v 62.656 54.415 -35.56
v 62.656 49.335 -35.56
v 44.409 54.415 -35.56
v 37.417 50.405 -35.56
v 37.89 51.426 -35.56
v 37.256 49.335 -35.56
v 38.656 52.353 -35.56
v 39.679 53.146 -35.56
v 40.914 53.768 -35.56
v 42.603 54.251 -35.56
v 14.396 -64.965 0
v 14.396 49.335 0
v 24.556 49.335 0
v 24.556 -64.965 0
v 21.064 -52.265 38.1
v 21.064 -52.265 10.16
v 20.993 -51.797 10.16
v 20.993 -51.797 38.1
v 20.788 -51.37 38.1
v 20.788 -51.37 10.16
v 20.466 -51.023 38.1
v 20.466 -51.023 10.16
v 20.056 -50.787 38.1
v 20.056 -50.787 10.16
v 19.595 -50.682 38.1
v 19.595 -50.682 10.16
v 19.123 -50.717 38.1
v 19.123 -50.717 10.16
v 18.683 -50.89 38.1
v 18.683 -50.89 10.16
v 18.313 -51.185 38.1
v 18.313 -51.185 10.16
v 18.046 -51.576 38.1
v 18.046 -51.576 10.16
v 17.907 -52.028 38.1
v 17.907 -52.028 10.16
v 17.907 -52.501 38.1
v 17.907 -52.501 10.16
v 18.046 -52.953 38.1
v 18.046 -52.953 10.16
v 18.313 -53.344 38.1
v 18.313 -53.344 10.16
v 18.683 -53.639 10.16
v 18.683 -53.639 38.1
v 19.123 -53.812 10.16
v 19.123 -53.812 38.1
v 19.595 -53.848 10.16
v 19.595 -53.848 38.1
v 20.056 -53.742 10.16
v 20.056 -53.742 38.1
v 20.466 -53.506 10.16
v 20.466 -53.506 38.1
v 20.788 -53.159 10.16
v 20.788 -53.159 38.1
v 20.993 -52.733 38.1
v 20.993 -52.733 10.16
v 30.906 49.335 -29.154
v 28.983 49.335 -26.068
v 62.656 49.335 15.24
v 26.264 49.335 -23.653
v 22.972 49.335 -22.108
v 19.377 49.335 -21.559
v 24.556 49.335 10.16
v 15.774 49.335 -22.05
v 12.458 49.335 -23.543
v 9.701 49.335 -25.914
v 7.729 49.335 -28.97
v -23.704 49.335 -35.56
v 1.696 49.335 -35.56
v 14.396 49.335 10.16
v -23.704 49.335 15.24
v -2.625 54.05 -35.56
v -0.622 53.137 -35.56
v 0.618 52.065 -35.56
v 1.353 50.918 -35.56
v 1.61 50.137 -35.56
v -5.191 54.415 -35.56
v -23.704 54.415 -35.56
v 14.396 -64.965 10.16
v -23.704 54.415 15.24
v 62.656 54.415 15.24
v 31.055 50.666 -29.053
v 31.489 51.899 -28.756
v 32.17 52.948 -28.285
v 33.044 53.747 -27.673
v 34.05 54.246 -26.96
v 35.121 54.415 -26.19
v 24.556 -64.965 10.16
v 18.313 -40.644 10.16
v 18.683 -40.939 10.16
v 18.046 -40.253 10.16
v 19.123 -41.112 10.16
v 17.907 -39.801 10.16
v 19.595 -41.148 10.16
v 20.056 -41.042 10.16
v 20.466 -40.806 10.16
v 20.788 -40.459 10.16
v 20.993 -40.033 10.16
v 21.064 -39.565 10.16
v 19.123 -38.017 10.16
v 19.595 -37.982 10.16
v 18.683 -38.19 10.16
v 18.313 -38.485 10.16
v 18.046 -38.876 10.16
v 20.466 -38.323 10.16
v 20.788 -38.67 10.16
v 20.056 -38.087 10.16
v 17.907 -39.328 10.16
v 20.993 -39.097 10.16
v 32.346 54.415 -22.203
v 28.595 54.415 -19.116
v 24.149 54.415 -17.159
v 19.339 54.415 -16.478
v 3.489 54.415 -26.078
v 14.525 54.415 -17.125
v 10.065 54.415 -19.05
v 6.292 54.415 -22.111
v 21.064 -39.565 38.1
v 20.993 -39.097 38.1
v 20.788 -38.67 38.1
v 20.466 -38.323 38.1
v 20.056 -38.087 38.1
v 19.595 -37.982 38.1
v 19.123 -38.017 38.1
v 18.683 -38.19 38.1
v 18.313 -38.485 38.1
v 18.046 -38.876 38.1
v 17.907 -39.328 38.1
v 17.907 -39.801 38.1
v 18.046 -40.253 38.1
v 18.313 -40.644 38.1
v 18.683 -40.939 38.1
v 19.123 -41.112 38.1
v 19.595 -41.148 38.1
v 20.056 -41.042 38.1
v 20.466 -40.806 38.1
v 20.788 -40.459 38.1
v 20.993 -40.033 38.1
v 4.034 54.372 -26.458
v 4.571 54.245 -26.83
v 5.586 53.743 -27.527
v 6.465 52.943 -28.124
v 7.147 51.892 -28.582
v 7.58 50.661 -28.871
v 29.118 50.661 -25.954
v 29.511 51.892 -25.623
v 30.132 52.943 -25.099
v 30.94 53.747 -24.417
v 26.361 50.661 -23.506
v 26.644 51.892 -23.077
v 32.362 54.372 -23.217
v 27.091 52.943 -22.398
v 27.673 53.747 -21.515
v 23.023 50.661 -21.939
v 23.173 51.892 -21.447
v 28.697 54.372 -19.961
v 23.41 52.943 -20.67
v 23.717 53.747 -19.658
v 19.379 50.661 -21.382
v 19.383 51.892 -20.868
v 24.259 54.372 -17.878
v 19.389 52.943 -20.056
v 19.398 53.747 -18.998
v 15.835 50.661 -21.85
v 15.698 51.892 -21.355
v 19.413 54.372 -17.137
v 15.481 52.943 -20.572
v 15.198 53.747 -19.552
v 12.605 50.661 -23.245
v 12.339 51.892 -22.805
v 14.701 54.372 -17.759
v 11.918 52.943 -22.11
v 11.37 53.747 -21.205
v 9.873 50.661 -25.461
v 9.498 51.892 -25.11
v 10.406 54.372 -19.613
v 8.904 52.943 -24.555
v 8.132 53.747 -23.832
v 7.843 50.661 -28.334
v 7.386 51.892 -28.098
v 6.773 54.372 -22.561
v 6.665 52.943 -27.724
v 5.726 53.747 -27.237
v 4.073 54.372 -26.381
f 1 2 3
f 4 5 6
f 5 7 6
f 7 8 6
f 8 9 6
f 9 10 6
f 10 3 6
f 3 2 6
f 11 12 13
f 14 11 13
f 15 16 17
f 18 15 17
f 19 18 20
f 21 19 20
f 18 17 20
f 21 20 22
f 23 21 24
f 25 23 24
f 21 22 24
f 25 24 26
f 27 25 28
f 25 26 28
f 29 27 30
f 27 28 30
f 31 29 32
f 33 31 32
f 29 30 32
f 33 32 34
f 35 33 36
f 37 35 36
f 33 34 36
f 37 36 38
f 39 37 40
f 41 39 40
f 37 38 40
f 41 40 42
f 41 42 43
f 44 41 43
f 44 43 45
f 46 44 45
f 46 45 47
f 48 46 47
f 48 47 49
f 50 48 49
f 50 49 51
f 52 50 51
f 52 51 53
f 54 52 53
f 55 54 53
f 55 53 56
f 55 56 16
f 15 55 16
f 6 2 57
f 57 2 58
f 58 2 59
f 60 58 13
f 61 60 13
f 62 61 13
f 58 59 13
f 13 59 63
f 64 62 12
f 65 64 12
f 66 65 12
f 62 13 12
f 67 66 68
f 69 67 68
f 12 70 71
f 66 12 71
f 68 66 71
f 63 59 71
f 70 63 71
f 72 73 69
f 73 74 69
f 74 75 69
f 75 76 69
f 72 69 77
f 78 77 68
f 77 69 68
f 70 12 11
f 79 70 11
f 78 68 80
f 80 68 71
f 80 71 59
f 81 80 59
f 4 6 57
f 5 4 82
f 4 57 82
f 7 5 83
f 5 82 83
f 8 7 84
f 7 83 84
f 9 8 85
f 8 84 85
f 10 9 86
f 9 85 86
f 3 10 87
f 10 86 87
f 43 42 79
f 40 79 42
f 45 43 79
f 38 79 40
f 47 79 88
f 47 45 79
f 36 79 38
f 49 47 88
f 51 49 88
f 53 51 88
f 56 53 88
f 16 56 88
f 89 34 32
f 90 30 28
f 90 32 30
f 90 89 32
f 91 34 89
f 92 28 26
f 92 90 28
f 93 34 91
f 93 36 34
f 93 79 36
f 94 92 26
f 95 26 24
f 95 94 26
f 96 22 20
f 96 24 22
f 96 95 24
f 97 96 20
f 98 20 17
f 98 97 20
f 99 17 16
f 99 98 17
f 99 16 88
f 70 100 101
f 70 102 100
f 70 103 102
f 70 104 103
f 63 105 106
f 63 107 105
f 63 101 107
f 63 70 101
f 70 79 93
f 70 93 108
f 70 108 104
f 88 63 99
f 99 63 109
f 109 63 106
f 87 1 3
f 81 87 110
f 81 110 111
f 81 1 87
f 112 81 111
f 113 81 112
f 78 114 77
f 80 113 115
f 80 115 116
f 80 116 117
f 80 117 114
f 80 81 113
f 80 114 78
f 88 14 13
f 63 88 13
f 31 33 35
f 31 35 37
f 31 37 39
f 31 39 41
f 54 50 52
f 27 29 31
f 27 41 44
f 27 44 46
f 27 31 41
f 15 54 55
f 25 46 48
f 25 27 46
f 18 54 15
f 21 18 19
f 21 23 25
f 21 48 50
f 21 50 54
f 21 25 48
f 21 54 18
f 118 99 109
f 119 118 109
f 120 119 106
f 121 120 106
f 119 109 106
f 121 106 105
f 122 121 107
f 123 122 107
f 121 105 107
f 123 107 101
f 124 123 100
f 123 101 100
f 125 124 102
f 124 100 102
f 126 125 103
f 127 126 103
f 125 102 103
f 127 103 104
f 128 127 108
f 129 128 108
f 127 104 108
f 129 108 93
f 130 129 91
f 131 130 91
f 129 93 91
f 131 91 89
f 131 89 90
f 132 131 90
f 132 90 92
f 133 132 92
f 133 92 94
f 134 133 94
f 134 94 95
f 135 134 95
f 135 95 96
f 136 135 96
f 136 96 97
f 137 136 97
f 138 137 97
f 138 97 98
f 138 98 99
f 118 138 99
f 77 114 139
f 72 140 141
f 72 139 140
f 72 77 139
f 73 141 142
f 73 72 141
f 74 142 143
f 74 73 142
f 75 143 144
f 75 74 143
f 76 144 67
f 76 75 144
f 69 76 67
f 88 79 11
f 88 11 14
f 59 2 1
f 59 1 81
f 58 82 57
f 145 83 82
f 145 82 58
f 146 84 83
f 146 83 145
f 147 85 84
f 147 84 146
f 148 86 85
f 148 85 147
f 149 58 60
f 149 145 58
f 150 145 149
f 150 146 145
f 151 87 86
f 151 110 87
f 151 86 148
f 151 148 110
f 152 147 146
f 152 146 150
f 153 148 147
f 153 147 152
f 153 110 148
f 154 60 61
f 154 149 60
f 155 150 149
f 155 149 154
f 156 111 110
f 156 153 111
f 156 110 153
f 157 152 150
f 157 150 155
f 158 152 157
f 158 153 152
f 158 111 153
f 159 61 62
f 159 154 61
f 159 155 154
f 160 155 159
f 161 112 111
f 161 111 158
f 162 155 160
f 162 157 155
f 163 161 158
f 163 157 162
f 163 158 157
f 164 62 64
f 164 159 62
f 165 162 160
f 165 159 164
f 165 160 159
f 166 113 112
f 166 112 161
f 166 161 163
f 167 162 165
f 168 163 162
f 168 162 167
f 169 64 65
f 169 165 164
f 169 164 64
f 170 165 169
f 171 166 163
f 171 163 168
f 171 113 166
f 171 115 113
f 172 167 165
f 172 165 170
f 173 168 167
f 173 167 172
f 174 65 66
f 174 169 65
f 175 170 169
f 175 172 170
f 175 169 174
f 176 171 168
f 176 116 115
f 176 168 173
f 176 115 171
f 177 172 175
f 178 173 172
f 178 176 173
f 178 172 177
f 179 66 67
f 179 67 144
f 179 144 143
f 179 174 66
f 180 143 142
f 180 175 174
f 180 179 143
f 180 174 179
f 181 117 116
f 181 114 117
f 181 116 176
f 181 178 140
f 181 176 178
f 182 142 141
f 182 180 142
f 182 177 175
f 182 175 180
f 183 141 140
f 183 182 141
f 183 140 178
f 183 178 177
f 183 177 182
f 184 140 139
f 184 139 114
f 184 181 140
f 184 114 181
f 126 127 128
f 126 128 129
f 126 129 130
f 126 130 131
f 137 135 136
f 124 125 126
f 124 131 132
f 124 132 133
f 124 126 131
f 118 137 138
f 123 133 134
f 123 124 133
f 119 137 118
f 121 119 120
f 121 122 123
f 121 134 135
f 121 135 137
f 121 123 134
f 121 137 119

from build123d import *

# Parameters (mm, degrees)
F0_R     = 1.5875
F1_DEPTH = 10.16
F2_DEPTH = 38.1
F3_W     = 10.16
F3_H     = 10.16
F3_W_2   = 25.4
F3_H_2   = 50.8
F4_DEPTH = 5.08
F5_DEPTH = 3.81
F6_R     = 5.07999


# Not quite as in the source:
# - a fillet or chamfer is up to 0.001 mm smaller than in the source, because OpenCascade refuses the exact size
# - a feature names something its author has since deleted; it is built from what else it names


with BuildPart() as f1:
    # F0 (on Top) → F1 (new body)
    with BuildSketch(Plane.XY):
        Polygon((24.5562880617, 49.3353436351), (14.3962880617, 49.3353436351), (14.3962880617, -7.8146563649), (14.3962880617, -39.5646563649), (14.3962880617, -64.9646563649), (24.5562880617, -64.9646563649), align=None)
        with Locations((19.4762880617, -39.5646563649)):
            Circle(F0_R, mode=Mode.SUBTRACT)
        with Locations((19.4762880617, -52.2646563649)):
            Circle(F0_R, mode=Mode.SUBTRACT)
    extrude(amount=F1_DEPTH)

    # F0 (on Top) → F2 (join)
    with BuildSketch(Plane.XY):
        with Locations((19.4762880617, -39.5646563649)):
            Circle(F0_R)
        with Locations((19.4762880617, -52.2646563649)):
            Circle(F0_R)
    extrude(amount=F2_DEPTH)

    # F3 (on face) → F4 (join)
    with BuildSketch(Plane(origin=(0, 49.3353436351, 0), x_dir=(-1, 0, 0), z_dir=(0, 1, 0))):
        with BuildLine():
            Line((-24.5562880617, 0), (-24.5562880617, 10.16))
            Line((-24.5562880617, 10.16), (-24.5562880617, 15.24))
            Line((-24.5562880617, 15.24), (-37.2562880617, 15.24))
            Line((-37.2562880617, 15.24), (-37.2562880617, -35.56))
            Line((-37.2562880617, -35.56), (-30.9062880617, -29.15440273))
            ThreePointArc((-30.9062880617, -29.15440273), (-19.3773342754, -21.5585615124), (-7.7287880617, -28.9696984238))
            Line((-7.7287880617, -28.9696984238), (-1.6962880617, -35.56))
            Line((-1.6962880617, -35.56), (-1.6962880617, 10.16))
            Line((-1.6962880617, 10.16), (-14.3962880617, 10.16))
            Line((-14.3962880617, 10.16), (-14.3962880617, 0))
            Line((-14.3962880617, 0), (-24.5562880617, 0))
        make_face()
        Polygon((-24.5562880617, 15.24), (-24.5562880617, 10.16), (-14.3962880617, 10.16), (-1.6962880617, 10.16), (-1.6962880617, 15.24), (-13.7612880617, 15.24), align=None)
        with Locations((-19.4762880617, 5.08)):
            Rectangle(F3_W, F3_H)
        with Locations((-49.9562880617, -10.16)):
            Rectangle(F3_W_2, F3_H_2)
        Polygon((-1.6962880617, 15.24), (-1.6962880617, 10.16), (-1.6962880617, -35.56), (23.7037119383, -35.56), (23.7037119383, 15.24), align=None)
    extrude(amount=F4_DEPTH)

    # F3 (on face) → F5 (join)
    with BuildSketch(Plane(origin=(0, 49.3353436351, 0), x_dir=(-1, 0, 0), z_dir=(0, 1, 0))):
        with Locations((-19.4762880617, 5.08)):
            Rectangle(F3_W, F3_H)
    extrude(amount=F5_DEPTH)

    # F6 (radius 5.08 in the source; OpenCascade refuses exactly that, so slightly less here)
    f6_edges = [f1.edges().sort_by_distance(p)[0] for p in [
        (19.377334, 54.415344, -21.558562),
        (4.712538, 54.415344, -32.264849),
        (34.081288, 54.415344, -32.357201),
    ]]
    fillet(f6_edges, radius=F6_R)


solid = f1.part
